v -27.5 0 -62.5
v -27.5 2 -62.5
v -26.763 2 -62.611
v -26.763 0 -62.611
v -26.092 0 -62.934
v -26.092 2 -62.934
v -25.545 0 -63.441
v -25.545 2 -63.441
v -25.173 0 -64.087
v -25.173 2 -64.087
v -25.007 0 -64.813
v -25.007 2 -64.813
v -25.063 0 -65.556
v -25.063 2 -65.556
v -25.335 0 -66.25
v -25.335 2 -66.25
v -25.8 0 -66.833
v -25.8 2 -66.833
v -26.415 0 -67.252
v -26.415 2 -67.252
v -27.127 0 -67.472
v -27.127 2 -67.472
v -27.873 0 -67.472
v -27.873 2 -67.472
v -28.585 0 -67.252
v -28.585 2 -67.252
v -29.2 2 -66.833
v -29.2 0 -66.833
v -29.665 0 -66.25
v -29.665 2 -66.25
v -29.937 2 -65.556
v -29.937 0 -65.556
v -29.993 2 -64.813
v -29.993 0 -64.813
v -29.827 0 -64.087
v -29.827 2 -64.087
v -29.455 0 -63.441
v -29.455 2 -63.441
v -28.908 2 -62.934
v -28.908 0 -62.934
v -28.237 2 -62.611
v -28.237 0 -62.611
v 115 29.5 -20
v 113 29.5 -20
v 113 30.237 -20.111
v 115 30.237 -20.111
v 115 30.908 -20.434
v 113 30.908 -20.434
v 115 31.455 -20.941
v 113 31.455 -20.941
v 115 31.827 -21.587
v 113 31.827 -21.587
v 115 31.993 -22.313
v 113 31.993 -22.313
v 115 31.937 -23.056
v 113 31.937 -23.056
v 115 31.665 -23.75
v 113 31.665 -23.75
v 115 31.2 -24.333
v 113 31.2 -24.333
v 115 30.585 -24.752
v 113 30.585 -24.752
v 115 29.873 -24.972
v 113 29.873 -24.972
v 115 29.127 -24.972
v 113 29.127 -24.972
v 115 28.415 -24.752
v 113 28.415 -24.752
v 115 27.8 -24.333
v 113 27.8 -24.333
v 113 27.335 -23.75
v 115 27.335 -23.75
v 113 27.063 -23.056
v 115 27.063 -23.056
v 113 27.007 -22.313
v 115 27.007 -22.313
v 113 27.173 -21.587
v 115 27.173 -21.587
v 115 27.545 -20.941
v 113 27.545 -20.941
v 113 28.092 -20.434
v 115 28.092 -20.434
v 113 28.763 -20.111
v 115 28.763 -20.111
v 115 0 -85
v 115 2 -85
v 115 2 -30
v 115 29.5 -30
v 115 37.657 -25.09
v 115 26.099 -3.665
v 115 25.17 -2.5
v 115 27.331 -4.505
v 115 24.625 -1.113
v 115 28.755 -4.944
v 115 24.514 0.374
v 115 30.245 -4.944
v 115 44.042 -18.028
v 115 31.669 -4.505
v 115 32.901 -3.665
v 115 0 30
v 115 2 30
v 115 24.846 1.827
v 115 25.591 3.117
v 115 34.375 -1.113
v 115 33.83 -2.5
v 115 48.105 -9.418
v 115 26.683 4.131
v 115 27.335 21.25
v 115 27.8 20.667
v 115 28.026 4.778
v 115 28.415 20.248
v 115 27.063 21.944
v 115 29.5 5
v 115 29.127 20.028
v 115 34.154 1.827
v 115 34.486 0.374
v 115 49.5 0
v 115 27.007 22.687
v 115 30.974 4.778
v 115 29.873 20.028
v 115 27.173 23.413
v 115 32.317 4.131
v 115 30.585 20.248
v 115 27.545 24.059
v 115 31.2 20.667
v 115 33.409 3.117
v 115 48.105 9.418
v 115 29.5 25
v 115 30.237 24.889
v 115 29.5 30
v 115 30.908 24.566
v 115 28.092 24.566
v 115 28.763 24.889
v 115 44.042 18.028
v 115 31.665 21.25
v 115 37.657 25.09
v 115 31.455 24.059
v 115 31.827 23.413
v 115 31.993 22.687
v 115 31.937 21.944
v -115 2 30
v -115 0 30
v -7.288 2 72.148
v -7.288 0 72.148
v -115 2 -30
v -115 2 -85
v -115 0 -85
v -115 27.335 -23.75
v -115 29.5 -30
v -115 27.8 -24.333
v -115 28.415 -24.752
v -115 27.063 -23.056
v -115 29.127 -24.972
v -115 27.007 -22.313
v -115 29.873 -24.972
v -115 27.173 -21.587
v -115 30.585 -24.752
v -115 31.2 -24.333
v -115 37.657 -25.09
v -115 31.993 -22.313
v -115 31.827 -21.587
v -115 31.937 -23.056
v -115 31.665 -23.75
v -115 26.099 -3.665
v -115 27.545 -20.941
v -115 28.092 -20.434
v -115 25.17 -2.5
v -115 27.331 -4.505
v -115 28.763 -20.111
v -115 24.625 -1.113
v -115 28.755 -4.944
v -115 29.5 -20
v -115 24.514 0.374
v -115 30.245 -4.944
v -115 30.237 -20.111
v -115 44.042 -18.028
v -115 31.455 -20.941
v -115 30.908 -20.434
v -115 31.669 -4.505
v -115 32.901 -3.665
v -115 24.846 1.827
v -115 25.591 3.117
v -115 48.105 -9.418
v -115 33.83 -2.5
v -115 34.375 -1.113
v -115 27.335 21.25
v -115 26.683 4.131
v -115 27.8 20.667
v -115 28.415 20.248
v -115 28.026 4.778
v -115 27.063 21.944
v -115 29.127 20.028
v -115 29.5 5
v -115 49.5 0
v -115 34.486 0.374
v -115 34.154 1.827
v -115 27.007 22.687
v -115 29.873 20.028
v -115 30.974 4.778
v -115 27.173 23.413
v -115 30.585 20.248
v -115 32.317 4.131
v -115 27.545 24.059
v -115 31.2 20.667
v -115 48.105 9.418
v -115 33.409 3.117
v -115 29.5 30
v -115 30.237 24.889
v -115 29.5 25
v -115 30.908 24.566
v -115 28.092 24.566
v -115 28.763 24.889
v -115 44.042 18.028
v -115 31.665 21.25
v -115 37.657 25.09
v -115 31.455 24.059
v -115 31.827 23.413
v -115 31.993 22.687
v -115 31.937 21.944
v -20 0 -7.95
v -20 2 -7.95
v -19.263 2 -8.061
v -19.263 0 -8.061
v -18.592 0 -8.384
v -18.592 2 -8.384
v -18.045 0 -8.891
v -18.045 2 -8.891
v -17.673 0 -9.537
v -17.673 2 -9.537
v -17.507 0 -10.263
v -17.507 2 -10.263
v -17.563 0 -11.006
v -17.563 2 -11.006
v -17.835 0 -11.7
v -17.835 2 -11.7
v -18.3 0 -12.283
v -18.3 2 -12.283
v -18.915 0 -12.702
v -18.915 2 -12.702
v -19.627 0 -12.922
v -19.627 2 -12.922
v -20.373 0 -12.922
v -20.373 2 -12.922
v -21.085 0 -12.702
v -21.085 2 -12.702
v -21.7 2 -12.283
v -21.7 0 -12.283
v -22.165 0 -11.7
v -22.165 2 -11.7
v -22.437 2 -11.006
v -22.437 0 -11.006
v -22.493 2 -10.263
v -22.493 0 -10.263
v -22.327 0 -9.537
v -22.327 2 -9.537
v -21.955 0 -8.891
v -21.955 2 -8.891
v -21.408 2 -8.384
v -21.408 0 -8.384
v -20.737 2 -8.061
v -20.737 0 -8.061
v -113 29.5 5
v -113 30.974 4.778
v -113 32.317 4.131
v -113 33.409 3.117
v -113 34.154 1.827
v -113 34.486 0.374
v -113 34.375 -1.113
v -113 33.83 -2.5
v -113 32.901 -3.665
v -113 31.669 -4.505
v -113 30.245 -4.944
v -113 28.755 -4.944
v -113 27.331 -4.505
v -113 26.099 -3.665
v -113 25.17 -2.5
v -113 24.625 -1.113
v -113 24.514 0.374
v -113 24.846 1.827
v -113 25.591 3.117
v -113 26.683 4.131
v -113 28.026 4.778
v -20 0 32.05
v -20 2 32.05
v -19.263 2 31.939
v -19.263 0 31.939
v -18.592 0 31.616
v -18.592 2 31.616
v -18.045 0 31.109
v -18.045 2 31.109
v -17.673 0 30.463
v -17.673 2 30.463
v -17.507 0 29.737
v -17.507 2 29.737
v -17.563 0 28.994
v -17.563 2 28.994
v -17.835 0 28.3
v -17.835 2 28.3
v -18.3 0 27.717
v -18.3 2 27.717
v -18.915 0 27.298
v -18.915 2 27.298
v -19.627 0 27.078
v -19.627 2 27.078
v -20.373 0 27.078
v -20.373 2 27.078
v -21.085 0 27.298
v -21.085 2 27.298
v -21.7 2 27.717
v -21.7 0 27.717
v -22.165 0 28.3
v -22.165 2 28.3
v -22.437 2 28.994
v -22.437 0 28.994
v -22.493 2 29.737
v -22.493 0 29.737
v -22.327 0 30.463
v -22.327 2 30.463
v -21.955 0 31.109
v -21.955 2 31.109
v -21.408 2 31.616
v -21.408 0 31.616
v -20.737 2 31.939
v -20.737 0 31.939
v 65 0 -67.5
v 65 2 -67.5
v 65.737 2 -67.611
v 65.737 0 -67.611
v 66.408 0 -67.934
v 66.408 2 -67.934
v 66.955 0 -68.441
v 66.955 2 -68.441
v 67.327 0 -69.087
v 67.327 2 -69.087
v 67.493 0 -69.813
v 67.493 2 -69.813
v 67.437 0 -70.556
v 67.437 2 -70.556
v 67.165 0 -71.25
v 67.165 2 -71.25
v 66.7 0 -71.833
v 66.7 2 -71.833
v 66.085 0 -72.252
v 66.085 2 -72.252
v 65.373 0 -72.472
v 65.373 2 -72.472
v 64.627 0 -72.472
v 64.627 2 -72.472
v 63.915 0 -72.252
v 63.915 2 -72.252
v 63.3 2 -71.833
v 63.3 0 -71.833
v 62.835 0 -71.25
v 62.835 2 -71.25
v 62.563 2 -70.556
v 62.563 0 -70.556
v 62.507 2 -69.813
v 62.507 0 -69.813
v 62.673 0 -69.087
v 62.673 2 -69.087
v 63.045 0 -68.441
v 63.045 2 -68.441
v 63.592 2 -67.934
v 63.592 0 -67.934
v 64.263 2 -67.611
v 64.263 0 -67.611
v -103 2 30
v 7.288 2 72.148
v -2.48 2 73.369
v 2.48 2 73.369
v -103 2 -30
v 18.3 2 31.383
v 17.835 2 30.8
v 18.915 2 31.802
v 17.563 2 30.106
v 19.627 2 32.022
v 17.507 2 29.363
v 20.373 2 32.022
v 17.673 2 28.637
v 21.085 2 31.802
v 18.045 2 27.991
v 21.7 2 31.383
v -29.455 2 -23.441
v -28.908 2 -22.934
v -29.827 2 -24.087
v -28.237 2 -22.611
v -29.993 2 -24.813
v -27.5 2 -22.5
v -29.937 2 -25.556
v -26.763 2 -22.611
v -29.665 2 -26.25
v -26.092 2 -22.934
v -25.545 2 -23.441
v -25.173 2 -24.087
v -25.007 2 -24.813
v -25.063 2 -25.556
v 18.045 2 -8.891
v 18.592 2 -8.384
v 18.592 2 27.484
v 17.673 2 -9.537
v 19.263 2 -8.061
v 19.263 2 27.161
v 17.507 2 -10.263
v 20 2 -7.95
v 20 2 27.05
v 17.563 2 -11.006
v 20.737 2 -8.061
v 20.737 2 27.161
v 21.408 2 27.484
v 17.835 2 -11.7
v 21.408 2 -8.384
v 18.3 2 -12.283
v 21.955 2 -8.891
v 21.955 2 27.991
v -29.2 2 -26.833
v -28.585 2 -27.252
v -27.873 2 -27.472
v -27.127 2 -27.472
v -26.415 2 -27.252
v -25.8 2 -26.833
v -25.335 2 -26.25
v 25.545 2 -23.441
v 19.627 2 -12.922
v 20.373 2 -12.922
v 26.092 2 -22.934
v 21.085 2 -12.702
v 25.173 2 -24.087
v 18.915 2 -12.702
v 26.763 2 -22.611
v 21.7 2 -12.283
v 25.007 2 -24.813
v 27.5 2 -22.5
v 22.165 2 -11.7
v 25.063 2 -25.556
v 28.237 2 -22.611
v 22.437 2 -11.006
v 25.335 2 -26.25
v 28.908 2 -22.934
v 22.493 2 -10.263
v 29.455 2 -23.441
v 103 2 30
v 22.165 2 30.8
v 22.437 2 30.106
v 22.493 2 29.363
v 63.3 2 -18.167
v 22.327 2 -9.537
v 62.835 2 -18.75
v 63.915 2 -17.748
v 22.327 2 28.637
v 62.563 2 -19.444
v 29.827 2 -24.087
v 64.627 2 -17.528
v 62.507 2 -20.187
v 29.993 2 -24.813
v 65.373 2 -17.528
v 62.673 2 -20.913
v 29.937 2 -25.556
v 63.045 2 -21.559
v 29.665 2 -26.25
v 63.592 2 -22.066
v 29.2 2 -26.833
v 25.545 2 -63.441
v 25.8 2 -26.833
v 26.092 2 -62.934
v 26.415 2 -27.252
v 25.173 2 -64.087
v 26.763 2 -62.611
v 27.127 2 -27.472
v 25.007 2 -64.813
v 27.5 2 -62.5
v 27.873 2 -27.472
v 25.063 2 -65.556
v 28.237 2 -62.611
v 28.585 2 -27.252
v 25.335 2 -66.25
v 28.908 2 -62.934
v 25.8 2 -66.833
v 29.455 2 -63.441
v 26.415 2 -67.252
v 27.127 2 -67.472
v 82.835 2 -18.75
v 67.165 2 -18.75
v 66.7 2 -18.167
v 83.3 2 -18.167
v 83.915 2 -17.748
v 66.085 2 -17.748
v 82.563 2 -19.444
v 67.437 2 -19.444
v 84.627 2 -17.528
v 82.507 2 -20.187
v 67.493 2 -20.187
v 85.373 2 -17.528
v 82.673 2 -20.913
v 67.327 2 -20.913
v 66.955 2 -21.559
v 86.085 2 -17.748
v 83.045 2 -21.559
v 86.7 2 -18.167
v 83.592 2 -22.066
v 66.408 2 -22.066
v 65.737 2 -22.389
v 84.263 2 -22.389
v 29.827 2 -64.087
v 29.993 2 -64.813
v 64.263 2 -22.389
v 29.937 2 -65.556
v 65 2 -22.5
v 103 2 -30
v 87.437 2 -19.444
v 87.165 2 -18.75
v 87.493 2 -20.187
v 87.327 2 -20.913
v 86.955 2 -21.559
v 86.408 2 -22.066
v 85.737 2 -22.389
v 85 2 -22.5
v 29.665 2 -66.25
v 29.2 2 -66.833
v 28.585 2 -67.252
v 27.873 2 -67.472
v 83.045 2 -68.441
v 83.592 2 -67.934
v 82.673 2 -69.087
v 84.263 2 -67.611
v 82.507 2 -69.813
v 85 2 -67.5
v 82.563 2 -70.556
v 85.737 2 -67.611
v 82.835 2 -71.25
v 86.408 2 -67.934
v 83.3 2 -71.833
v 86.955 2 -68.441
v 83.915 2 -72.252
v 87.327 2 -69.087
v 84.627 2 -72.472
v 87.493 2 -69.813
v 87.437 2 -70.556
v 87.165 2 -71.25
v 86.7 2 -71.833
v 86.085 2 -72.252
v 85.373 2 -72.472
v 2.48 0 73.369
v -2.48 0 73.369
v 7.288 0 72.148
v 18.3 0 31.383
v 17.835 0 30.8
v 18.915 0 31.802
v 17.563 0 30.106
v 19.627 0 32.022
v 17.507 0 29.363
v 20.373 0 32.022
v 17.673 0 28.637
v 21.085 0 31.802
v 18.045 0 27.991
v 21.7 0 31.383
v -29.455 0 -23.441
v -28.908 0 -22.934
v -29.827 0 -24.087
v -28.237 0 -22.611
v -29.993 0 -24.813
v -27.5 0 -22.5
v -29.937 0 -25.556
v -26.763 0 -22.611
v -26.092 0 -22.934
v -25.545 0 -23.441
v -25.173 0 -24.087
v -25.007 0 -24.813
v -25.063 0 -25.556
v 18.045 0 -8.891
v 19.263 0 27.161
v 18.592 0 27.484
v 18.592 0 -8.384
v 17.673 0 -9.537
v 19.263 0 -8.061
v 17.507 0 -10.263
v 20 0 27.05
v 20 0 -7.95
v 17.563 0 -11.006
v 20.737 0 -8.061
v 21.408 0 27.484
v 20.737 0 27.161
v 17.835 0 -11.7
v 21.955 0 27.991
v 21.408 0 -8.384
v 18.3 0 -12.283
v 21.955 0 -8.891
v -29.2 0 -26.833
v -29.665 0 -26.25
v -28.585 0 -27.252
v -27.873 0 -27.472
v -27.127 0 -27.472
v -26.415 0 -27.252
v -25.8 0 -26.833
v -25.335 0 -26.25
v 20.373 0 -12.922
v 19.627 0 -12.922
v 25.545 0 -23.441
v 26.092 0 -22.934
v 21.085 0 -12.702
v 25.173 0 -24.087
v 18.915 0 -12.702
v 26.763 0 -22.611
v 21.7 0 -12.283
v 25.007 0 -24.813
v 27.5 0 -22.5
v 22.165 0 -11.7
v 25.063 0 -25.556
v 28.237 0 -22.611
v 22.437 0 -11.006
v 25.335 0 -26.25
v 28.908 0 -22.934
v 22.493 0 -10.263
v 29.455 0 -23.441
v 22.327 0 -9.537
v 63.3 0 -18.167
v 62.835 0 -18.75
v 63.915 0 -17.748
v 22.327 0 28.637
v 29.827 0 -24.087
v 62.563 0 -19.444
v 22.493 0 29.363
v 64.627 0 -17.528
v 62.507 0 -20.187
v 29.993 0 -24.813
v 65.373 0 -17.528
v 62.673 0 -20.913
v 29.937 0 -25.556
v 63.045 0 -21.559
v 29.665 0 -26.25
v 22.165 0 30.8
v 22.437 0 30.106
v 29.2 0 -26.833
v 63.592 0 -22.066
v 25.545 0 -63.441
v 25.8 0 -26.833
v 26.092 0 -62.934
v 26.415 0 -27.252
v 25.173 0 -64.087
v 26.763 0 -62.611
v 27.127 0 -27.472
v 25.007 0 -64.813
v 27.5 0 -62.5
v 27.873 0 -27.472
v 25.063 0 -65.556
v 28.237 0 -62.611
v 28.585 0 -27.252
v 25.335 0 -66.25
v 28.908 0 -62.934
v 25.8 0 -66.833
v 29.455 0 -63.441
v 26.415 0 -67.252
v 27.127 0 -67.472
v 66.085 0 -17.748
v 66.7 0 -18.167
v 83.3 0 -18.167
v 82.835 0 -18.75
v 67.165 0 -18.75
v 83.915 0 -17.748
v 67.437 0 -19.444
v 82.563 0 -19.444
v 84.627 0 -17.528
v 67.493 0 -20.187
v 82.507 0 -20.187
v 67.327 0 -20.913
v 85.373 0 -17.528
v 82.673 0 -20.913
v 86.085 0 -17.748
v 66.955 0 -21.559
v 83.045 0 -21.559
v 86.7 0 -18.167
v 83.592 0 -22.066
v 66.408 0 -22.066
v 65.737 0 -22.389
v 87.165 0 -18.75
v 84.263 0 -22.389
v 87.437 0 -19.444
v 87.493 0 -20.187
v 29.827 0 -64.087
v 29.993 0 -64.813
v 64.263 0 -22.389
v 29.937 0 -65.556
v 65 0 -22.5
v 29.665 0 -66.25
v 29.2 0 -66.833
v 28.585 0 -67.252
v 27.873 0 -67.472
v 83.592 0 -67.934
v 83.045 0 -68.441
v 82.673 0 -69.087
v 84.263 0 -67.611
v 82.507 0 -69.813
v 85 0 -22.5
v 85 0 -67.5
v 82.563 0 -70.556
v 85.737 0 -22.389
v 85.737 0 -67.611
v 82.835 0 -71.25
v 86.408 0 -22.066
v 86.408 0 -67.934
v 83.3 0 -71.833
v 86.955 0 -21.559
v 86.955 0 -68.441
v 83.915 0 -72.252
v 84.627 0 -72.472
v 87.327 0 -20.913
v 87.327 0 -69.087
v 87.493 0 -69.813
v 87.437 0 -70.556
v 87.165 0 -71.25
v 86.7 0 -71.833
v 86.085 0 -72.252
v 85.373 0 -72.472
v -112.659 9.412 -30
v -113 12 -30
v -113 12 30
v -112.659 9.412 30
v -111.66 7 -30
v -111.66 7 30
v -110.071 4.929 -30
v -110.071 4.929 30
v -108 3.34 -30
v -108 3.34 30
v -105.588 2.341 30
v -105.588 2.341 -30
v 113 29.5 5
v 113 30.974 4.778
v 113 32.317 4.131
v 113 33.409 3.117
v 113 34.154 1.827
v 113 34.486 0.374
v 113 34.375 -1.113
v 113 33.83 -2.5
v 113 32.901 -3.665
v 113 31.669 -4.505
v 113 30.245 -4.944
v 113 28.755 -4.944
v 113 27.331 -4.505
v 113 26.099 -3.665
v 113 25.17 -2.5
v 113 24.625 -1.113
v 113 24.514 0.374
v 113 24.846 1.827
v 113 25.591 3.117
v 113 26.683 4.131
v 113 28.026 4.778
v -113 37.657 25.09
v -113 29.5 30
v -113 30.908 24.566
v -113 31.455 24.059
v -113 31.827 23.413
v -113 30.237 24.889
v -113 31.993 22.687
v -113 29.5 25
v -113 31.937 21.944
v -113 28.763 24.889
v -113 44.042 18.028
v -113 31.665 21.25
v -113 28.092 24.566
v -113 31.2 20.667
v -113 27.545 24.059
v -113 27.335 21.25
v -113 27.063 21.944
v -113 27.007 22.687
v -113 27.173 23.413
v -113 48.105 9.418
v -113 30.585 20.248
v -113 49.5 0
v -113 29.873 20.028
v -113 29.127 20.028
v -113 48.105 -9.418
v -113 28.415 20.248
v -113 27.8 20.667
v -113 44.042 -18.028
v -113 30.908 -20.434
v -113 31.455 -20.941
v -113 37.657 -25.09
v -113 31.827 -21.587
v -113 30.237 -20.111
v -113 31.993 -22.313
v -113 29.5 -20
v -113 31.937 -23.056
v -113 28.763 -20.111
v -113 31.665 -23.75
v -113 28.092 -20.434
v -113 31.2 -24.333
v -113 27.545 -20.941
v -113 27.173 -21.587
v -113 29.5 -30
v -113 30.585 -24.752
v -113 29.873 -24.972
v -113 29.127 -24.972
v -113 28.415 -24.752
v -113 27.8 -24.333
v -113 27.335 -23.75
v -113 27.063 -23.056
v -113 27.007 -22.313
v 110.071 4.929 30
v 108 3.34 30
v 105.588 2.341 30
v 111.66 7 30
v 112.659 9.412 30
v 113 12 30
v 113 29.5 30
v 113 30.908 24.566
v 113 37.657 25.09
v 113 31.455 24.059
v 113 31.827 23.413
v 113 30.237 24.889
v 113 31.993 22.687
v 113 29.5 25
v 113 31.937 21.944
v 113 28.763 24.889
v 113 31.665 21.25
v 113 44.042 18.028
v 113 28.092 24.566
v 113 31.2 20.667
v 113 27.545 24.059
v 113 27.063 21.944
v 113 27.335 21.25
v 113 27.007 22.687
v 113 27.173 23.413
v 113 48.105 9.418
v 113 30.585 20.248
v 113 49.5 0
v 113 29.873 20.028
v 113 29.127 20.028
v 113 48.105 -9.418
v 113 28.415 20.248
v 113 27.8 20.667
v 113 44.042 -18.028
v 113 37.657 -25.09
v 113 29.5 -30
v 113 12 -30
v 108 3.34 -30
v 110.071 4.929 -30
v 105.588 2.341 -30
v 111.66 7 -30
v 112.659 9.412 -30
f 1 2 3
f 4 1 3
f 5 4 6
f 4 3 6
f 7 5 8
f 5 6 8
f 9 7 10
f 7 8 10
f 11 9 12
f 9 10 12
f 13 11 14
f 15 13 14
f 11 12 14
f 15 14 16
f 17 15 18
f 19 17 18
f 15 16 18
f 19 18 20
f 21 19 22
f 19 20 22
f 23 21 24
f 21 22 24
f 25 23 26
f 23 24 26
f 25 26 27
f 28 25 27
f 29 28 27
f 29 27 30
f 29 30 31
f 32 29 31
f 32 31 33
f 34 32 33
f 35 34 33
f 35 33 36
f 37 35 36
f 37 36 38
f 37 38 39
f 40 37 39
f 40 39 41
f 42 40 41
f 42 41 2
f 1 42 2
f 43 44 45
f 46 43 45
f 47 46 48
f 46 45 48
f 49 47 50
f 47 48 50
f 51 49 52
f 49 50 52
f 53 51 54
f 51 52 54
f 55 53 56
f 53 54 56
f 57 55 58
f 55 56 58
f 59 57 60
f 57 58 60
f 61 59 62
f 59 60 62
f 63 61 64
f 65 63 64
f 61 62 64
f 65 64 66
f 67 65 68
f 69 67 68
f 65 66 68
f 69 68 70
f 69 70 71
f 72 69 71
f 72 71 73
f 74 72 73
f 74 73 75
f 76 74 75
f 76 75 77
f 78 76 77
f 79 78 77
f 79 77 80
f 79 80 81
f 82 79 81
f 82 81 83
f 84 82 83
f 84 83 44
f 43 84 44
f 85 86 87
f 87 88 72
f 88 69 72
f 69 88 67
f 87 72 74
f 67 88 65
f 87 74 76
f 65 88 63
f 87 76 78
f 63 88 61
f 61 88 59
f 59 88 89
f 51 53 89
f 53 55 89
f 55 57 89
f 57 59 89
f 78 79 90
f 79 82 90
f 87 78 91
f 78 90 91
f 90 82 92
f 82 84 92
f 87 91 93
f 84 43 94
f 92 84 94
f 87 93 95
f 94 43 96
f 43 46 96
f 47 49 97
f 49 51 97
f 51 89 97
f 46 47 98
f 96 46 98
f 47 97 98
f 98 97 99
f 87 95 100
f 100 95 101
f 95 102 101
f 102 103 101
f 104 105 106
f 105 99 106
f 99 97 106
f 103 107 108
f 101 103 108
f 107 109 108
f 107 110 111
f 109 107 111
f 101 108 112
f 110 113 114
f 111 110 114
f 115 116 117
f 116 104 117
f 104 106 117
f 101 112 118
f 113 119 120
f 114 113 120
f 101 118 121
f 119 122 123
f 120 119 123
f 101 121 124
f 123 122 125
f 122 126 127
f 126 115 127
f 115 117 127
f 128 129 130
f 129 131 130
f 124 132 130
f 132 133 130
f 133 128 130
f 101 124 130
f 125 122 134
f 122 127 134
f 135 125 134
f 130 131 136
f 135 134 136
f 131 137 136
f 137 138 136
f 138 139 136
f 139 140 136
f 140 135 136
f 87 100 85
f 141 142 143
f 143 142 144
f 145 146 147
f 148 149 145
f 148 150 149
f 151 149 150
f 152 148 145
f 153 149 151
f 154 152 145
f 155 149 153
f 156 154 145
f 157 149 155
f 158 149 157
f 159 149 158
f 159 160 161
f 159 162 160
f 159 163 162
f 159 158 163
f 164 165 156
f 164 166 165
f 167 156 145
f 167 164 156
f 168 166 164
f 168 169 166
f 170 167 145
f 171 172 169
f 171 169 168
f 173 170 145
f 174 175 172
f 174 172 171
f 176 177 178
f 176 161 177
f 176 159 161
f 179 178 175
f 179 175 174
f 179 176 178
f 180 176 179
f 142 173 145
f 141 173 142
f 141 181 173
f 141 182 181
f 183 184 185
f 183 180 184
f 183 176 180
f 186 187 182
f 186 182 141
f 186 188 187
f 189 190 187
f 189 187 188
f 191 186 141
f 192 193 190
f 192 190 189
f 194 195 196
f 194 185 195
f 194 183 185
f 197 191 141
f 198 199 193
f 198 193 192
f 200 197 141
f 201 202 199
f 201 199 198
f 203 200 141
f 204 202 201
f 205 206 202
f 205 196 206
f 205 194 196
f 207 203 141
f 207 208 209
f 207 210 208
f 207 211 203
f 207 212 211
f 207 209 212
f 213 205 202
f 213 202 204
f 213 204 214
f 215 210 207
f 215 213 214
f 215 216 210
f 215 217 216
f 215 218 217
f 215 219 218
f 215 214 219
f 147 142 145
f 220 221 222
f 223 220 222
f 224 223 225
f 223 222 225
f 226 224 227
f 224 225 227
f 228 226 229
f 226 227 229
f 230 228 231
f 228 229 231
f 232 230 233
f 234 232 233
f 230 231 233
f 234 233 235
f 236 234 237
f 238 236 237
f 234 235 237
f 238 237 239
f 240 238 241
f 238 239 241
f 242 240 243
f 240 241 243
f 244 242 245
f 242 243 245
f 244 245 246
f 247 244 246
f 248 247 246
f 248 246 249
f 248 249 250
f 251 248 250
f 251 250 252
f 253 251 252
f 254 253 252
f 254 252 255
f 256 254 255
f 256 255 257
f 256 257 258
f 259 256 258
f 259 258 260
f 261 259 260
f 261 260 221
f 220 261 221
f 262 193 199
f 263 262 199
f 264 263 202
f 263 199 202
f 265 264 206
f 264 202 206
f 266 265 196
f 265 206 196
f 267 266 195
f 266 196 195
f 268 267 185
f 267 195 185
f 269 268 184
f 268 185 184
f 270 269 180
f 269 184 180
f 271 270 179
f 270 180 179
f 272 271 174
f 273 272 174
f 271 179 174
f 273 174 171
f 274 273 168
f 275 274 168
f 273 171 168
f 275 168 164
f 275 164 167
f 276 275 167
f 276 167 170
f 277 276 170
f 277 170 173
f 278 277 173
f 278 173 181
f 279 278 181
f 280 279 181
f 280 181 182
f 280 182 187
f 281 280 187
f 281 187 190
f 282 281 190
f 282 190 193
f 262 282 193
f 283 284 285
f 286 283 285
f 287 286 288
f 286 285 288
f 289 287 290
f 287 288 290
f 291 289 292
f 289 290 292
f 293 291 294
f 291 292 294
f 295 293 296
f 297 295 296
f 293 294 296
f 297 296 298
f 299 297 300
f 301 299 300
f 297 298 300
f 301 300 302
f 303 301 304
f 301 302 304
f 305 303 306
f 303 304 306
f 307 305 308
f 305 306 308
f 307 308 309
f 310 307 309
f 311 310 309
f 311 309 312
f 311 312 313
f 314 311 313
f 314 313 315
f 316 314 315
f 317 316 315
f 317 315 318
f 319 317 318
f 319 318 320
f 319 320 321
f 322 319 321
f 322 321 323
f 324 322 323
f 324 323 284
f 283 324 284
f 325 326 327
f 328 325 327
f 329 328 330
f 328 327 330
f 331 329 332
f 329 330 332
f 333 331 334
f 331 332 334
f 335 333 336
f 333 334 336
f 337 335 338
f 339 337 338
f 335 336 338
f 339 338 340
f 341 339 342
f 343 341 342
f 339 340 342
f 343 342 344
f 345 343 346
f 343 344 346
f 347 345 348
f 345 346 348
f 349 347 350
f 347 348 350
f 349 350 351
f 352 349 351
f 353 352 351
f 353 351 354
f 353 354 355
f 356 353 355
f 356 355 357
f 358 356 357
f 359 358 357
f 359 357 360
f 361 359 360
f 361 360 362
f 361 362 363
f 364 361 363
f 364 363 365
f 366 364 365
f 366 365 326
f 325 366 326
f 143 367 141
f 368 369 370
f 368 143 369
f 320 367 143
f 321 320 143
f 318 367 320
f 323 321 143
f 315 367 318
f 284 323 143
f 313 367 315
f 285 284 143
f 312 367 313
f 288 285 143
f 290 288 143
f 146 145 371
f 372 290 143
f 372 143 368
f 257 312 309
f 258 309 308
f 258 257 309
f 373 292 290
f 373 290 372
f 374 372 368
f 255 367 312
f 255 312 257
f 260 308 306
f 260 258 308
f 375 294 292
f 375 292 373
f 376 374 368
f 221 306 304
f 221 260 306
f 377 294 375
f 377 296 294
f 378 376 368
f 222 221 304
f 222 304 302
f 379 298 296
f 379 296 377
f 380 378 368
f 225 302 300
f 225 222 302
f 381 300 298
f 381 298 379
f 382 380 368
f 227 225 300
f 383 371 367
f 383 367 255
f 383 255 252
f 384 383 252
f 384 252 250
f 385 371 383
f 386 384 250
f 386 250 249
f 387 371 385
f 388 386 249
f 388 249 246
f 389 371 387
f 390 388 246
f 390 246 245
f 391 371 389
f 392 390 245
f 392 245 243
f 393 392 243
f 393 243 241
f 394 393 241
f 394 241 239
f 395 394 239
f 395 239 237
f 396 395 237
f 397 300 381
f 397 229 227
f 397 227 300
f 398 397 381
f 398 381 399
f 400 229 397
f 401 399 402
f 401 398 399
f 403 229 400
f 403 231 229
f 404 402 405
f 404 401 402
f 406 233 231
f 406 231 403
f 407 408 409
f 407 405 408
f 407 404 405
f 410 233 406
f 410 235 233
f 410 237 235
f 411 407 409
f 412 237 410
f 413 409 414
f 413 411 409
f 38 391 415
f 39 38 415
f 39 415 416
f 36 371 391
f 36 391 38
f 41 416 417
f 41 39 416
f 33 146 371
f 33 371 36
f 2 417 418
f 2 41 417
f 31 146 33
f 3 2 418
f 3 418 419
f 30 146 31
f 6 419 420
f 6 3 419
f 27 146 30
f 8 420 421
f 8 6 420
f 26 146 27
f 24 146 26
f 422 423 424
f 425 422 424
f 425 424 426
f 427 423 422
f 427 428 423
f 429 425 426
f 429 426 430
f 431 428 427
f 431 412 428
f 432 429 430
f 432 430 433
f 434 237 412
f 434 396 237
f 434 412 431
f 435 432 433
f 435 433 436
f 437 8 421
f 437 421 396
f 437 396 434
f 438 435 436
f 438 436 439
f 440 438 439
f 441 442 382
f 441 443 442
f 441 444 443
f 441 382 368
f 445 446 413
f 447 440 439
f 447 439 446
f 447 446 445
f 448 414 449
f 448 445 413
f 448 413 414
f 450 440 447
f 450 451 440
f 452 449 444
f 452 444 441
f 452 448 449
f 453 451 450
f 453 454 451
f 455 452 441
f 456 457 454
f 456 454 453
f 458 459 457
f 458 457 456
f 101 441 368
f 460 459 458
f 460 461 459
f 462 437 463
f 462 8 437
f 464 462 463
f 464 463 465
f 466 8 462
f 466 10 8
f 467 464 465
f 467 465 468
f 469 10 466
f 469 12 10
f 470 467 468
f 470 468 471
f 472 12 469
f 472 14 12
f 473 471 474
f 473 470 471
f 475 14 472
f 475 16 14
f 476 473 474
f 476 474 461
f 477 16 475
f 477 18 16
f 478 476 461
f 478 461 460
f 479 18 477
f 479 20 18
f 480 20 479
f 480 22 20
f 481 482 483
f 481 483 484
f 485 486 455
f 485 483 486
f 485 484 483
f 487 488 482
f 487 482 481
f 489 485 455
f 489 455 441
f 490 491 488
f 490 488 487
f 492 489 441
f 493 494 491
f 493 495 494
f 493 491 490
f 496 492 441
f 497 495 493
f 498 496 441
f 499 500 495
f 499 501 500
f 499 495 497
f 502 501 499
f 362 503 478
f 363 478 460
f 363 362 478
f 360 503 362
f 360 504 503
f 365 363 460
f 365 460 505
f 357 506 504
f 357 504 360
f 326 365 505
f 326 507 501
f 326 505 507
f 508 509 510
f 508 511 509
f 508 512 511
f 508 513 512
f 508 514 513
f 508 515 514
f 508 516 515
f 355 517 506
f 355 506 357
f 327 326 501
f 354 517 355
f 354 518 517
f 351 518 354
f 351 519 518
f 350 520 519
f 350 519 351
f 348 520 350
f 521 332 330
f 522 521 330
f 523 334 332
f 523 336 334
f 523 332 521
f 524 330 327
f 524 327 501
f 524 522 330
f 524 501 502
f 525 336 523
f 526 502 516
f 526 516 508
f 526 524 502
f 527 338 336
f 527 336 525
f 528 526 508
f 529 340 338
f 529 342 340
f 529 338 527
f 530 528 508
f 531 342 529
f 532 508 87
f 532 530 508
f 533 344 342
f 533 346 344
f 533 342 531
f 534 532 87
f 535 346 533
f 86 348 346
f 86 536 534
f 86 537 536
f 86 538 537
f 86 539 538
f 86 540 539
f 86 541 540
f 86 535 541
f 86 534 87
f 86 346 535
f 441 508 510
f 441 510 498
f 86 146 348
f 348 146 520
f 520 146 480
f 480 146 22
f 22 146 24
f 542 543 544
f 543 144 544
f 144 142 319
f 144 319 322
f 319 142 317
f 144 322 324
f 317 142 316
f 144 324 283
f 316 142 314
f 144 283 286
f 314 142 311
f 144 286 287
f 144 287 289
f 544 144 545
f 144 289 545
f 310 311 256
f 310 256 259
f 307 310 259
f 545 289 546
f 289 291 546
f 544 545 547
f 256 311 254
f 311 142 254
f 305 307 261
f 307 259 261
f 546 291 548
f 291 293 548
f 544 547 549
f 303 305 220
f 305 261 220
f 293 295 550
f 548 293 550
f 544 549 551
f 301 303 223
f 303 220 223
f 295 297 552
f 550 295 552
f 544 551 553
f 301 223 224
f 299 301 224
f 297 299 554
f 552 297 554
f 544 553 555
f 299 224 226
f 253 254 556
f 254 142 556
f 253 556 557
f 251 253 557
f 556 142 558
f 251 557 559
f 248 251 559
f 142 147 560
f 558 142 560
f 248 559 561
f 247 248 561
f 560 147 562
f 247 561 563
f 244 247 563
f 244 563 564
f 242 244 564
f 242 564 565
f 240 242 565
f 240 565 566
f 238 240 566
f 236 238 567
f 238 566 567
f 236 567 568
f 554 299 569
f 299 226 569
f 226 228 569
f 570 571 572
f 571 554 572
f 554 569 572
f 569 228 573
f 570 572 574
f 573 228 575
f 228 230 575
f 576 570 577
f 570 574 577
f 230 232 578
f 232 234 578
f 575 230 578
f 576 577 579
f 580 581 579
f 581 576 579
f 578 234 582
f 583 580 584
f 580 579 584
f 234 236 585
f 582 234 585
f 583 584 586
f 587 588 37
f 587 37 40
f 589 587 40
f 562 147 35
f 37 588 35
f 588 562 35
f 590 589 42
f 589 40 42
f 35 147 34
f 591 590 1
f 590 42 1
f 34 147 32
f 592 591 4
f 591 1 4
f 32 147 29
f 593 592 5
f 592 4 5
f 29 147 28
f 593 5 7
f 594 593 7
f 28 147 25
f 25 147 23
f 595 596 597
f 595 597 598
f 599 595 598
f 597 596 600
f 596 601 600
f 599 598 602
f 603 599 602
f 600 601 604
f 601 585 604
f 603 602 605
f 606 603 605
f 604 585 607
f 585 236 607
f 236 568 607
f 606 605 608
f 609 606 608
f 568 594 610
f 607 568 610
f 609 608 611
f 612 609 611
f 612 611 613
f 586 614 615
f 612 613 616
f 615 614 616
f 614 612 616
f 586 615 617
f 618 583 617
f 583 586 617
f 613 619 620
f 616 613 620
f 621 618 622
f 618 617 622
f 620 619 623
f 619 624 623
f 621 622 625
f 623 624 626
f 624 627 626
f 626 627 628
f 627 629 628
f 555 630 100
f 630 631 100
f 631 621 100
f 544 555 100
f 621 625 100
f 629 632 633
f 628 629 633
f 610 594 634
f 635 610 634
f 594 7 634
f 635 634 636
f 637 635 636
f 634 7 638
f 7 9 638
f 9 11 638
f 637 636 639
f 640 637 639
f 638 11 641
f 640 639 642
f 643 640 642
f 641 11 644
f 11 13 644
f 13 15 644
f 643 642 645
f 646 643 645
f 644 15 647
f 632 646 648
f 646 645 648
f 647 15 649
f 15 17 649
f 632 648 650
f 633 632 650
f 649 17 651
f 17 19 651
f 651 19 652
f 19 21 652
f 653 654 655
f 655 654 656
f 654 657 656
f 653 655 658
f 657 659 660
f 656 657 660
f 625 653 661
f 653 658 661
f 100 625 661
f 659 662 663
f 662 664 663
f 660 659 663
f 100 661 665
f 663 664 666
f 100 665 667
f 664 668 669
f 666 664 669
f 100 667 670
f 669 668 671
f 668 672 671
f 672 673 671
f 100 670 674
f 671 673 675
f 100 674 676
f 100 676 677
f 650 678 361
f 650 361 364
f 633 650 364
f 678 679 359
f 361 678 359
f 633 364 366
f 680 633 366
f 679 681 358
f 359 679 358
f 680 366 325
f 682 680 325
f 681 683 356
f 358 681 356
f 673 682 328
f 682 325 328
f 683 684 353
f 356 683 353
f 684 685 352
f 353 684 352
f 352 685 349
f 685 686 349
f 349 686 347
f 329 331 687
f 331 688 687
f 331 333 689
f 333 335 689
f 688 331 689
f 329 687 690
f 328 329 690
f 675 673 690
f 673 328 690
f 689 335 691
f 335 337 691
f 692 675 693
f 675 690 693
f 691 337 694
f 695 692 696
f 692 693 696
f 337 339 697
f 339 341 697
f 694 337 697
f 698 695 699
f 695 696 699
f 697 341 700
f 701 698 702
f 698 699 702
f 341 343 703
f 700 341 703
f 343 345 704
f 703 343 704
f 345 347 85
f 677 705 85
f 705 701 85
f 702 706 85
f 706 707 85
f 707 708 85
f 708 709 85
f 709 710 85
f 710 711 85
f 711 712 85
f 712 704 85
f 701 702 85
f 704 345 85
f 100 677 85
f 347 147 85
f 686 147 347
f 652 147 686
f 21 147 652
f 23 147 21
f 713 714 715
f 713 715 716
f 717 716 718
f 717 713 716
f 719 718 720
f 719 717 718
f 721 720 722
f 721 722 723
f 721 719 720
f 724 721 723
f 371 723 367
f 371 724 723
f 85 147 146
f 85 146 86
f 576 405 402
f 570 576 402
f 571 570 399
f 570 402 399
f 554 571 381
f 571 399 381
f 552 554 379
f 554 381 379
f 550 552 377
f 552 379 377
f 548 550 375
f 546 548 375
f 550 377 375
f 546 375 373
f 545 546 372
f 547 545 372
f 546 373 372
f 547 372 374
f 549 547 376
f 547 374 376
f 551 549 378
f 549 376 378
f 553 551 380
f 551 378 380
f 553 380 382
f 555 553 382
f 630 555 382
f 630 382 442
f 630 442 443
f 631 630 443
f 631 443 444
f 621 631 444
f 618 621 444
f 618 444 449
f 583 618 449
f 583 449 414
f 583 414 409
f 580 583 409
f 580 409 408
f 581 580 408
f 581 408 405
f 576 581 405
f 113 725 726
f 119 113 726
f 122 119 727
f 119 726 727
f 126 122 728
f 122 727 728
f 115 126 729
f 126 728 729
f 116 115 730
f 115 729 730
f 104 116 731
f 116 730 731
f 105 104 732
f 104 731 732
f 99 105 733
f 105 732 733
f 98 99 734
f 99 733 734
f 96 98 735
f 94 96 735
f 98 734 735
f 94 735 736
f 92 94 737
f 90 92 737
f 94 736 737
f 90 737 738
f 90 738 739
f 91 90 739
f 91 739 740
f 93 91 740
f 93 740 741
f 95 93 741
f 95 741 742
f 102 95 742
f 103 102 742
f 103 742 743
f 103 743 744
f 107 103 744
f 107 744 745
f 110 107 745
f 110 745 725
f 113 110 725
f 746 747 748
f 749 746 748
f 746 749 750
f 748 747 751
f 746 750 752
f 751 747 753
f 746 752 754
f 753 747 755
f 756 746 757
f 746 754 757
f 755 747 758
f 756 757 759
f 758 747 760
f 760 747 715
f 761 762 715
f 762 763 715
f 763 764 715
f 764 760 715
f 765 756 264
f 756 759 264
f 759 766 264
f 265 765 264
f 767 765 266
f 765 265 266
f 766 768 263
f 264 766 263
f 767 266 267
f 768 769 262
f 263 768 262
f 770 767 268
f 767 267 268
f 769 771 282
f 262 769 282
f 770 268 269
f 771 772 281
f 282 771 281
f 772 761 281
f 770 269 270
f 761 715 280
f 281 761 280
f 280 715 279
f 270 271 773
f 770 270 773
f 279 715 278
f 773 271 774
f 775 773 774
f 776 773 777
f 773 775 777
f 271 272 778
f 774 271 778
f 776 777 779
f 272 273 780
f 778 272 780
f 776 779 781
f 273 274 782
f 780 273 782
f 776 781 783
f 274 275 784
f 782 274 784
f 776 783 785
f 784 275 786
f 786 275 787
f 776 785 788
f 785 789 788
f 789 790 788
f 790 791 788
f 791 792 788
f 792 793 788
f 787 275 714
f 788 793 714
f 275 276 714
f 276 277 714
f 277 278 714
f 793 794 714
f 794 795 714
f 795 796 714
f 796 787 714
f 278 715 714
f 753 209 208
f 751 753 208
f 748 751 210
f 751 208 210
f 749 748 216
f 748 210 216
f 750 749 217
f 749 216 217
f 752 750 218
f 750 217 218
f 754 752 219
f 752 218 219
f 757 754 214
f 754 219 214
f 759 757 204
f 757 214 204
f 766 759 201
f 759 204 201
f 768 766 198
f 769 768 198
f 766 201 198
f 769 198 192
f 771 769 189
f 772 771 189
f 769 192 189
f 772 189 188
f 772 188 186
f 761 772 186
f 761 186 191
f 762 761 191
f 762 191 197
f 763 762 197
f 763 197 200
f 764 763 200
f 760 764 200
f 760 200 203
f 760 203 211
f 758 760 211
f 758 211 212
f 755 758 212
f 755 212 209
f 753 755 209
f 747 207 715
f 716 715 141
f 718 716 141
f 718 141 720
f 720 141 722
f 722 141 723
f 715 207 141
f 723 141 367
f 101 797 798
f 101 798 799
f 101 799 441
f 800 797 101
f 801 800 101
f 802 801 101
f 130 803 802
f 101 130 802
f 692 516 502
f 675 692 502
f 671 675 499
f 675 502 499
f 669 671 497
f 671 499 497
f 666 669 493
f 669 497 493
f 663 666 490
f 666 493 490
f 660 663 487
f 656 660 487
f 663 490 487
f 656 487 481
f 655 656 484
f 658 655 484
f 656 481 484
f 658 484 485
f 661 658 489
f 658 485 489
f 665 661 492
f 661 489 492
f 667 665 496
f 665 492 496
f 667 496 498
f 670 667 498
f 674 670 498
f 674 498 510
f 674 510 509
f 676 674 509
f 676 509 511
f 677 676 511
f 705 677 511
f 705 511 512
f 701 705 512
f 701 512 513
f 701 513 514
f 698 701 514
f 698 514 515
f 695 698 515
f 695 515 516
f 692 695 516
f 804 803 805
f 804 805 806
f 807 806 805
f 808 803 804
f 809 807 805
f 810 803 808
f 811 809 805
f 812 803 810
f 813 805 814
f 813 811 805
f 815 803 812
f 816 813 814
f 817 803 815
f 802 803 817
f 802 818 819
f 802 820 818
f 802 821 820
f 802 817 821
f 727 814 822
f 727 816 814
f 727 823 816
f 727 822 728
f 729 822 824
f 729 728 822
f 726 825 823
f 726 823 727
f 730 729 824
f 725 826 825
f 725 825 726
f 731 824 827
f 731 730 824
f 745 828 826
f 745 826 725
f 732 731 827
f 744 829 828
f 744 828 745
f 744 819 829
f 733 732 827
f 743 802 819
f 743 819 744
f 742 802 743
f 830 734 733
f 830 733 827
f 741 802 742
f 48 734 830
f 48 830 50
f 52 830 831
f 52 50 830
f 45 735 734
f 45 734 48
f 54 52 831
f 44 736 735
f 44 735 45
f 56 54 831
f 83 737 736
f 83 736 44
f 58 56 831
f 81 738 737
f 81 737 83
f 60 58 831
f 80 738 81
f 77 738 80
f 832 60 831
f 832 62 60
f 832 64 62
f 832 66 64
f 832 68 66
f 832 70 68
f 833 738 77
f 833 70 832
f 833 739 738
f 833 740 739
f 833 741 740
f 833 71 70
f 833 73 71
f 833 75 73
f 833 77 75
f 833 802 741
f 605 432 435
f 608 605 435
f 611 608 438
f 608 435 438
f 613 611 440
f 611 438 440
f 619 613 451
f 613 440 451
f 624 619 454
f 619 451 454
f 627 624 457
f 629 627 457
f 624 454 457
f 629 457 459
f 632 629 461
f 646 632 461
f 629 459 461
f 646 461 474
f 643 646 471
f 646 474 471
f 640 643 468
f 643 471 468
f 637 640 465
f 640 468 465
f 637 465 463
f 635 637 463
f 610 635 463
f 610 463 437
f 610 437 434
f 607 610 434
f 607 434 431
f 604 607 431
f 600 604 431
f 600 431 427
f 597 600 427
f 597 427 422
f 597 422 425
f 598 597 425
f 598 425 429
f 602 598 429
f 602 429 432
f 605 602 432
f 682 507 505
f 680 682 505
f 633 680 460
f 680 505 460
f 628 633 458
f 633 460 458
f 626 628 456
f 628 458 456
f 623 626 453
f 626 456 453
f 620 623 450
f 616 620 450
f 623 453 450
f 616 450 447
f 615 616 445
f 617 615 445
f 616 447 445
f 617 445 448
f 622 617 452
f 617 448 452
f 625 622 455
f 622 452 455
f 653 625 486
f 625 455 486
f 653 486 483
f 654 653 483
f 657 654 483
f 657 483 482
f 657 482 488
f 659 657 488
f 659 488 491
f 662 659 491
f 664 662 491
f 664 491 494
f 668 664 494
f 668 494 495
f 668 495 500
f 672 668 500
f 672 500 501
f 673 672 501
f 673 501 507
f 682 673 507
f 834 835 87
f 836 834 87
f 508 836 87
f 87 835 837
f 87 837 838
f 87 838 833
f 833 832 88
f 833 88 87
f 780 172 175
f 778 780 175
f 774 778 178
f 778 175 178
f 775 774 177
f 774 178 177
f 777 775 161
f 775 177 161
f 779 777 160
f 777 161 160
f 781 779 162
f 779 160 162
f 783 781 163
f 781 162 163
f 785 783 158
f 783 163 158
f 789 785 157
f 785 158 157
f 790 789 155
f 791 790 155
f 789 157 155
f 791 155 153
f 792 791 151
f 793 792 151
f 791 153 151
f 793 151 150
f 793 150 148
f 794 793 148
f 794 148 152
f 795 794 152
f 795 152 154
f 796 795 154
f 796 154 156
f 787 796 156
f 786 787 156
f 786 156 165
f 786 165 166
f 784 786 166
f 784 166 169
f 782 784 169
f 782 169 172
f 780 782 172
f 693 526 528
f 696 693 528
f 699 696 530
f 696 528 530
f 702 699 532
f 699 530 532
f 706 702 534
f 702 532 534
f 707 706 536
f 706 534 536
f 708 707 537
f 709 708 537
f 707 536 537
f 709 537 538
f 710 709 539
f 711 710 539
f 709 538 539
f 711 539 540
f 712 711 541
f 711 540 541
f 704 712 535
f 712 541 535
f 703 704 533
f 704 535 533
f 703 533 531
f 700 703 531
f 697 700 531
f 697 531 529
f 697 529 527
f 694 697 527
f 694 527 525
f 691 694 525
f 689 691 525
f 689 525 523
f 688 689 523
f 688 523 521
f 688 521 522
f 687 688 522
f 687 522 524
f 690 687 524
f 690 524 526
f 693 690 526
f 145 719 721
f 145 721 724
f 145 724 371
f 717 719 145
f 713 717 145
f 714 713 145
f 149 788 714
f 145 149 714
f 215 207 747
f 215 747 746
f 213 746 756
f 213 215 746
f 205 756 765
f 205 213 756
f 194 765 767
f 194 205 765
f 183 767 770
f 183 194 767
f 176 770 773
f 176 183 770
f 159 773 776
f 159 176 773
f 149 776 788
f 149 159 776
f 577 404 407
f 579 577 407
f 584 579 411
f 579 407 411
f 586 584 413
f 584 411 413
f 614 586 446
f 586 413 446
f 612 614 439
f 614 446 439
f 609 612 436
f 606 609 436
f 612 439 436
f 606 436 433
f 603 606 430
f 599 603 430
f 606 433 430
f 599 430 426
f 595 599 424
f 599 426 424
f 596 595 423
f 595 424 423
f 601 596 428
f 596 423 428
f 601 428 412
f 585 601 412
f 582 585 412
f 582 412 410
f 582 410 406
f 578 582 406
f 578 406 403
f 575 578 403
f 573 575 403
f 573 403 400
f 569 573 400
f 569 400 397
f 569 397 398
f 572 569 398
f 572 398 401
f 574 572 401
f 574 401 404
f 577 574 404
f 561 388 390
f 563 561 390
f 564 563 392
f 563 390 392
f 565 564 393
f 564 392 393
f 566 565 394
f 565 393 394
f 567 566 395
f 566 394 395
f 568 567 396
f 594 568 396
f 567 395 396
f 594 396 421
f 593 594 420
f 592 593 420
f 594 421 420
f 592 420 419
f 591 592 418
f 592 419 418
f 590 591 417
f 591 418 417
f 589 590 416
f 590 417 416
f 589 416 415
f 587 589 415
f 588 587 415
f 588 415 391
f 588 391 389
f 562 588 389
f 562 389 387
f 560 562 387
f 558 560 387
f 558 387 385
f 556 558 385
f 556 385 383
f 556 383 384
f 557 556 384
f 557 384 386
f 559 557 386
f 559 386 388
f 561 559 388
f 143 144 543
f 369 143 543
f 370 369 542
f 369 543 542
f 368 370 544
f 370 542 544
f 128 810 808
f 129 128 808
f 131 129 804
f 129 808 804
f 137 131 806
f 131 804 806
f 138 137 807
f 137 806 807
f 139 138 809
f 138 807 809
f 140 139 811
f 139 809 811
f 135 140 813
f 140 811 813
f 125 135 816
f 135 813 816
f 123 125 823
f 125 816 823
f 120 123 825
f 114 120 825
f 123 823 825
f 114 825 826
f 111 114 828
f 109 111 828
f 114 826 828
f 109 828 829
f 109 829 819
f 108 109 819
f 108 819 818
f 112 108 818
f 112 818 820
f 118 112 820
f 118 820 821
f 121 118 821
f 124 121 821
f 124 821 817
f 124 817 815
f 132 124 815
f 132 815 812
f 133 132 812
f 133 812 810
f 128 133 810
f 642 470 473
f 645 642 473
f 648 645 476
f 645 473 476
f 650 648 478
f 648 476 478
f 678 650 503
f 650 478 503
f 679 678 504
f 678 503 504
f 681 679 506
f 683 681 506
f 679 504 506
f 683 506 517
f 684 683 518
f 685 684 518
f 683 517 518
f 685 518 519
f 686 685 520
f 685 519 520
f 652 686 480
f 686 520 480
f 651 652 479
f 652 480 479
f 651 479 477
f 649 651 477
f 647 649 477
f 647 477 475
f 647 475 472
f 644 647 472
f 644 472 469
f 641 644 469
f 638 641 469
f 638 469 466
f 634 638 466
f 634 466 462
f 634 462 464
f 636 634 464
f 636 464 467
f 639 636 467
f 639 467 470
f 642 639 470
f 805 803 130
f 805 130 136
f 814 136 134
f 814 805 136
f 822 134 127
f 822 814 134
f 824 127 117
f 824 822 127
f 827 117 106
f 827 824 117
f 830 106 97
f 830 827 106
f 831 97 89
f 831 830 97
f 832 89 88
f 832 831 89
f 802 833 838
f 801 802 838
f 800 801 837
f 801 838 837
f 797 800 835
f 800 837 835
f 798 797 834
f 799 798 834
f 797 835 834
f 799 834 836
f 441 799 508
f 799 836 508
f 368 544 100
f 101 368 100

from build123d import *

# Parameters (mm, degrees)
BOSS_EXTRUDE1_DEPTH      = 2
SKETCH2_W                = 2
SKETCH2_H                = 60
BOSS_EXTRUDE2_DEPTH      = 55
SKETCH3_R                = 5
CUT_EXTRUDE1_DEPTH       = 283
SKETCH4_R                = 2.5
CUT_EXTRUDE2_DEPTH       = 283
SKETCH9_W                = 230
SKETCH9_H                = 50
BOSS_EXTRUDE3_DEPTH      = 2
SKETCH13_W               = 230
SKETCH13_H               = 10
BOSS_EXTRUDE6_DEPTH      = 20
CUT_EXTRUDE9_START       = -230
CUT_EXTRUDE9_DEPTH       = 230
SKETCH31_R               = 2.5
CUT_EXTRUDE11_DEPTH      = 10
SKETCH32_R               = 2.5
CUT_EXTRUDE12_DEPTH      = 10
SKETCH33_R               = 2.5
CUT_EXTRUDE13_DEPTH      = 10
CUT_EXTRUDE14_DEPTH      = 180.947909129
CUT_EXTRUDE14_DEPTH_BACK = 180.947909129
CUT_EXTRUDE16_DEPTH      = 151.685931659
CUT_EXTRUDE16_DEPTH_BACK = 151.685931659
BOSS_EXTRUDE8_DEPTH      = 60


# Read off the part's stored shape, not the designer's step: Cut-Extrude9
with BuildPart() as part:
    # Sketch1 → Boss-Extrude1 (new body)
    with BuildSketch(Plane(origin=(0, 0, 0), x_dir=(1, 0, 0), z_dir=(0, 1, 0))):
        Polygon((115, 50), (115, 80), (-115, 80), (-115, 50), (-115, -50), (-115, -75), (115, -75), (115, -50), align=None)
    extrude(amount=BOSS_EXTRUDE1_DEPTH)

    # Sketch2 → Boss-Extrude2 (add)
    with BuildSketch(Plane(origin=(0, 2, 0), x_dir=(1, 0, 0), z_dir=(0, 1, 0))):
        with Locations((-114, 0)):
            Rectangle(SKETCH2_W, SKETCH2_H)
        with Locations((114, 0)):
            Rectangle(SKETCH2_W, SKETCH2_H)
    extrude(amount=BOSS_EXTRUDE2_DEPTH)

    # Sketch3 → Cut-Extrude1 (cut)
    with BuildSketch(Plane.ZY.offset(115)):
        with Locations((0, 29.5)):
            Circle(SKETCH3_R)
    extrude(amount=-CUT_EXTRUDE1_DEPTH, mode=Mode.SUBTRACT)

    # Sketch4 → Cut-Extrude2 (cut)
    with BuildSketch(Plane.ZY.offset(115)):
        with Locations((-22.5, 29.5)):
            Circle(SKETCH4_R)
        with Locations((22.5, 29.5)):
            Circle(SKETCH4_R)
    extrude(amount=-CUT_EXTRUDE2_DEPTH, mode=Mode.SUBTRACT)

    # Sketch9 → Boss-Extrude3 (add)
    with BuildSketch(Plane(origin=(0, 2, 0), x_dir=(1, 0, 0), z_dir=(0, 1, 0))):
        with Locations((0, 105)):
            Rectangle(SKETCH9_W, SKETCH9_H)
    extrude(amount=-BOSS_EXTRUDE3_DEPTH)

    # Sketch13 → Boss-Extrude6 (add)
    with BuildSketch(Plane.XZ):
        with Locations((0, -125)):
            Rectangle(SKETCH13_W, SKETCH13_H)
    extrude(amount=BOSS_EXTRUDE6_DEPTH)

    # Cut-Extrude9 outline → Cut-Extrude9 (cut)
    with BuildSketch(Plane(origin=(115, 0, 0), x_dir=(0, 0, -1), z_dir=(1, 0, 0)).offset(CUT_EXTRUDE9_START)):
        with BuildLine():
            Line((-30, 57), (-30, 29.5))
            ThreePointArc((-30, 29.5), (0, 49.5), (30, 29.5))
            Line((30, 29.5), (30, 57))
            Line((30, 57), (-30, 57))
        make_face()
    extrude(amount=CUT_EXTRUDE9_DEPTH, mode=Mode.SUBTRACT)

    # Sketch31 → Cut-Extrude11 (cut)
    with BuildSketch(Plane(origin=(0, 2, 0), x_dir=(1, 0, 0), z_dir=(0, 1, 0))):
        with Locations(Location((-27.5, 65, 0), (0, 0, 270))):
            Circle(SKETCH31_R)
        with Locations(Location((27.5, 65, 0), (0, 0, 270))):
            Circle(SKETCH31_R)
        with Locations(Location((-27.5, 25, 0), (0, 0, 270))):
            Circle(SKETCH31_R)
        with Locations(Location((27.5, 25, 0), (0, 0, 270))):
            Circle(SKETCH31_R)
    extrude(amount=-CUT_EXTRUDE11_DEPTH, mode=Mode.SUBTRACT)

    # Sketch32 → Cut-Extrude12 (cut)
    with BuildSketch(Plane(origin=(0, 2, 0), x_dir=(1, 0, 0), z_dir=(0, 1, 0))):
        with Locations(Location((85, 70, 0), (0, 0, 270))):
            Circle(SKETCH32_R)
        with Locations(Location((65, 70, 0), (0, 0, 270))):
            Circle(SKETCH32_R)
        with Locations(Location((65, 20, 0), (0, 0, 90))):
            Circle(SKETCH32_R)
        with Locations(Location((85, 20, 0), (0, 0, 90))):
            Circle(SKETCH32_R)
    extrude(amount=-CUT_EXTRUDE12_DEPTH, mode=Mode.SUBTRACT)

    # Sketch33 → Cut-Extrude13 (cut)
    with BuildSketch(Plane(origin=(0, 2, 0), x_dir=(1, 0, 0), z_dir=(0, 1, 0))):
        with Locations(Location((-20, 10.45, 0), (0, 0, 270))):
            Circle(SKETCH33_R)
        with Locations(Location((20, 10.45, 0), (0, 0, 270))):
            Circle(SKETCH33_R)
        with Locations(Location((-20, -29.55, 0), (0, 0, 270))):
            Circle(SKETCH33_R)
        with Locations(Location((20, -29.55, 0), (0, 0, 90))):
            Circle(SKETCH33_R)
    extrude(amount=-CUT_EXTRUDE13_DEPTH, mode=Mode.SUBTRACT)

    # Sketch34 → Cut-Extrude14 (cut, two sides: drawn at the far end of the back side and taken through both)
    with BuildSketch(Plane(origin=(0, 2, 0), x_dir=(1, 0, 0), z_dir=(0, 1, 0)).offset(-CUT_EXTRUDE14_DEPTH_BACK)):
        Polygon((685.357029045, 85), (115, 85), (-115, 85), (-685.357029045, 85), (-685.357029045, 1225.71405809), (685.357029045, 1225.71405809), align=None)
    extrude(amount=CUT_EXTRUDE14_DEPTH + CUT_EXTRUDE14_DEPTH_BACK, mode=Mode.SUBTRACT)

    # Sketch36 → Cut-Extrude16 (cut, two sides: drawn at the far end of the back side and taken through both)
    with BuildSketch(Plane(origin=(0, 2, 0), x_dir=(1, 0, 0), z_dir=(0, 1, 0)).offset(-CUT_EXTRUDE16_DEPTH_BACK)):
        with BuildLine():
            Line((-603.246524362, 161.052987794), (-115, -30))
            Line((-115, -30), (-7.287986972, -72.148179011))
            ThreePointArc((-7.287986972, -72.148179011), (0, -73.523323417), (7.287986972, -72.148179011))
            Line((7.287986972, -72.148179011), (115, -30))
            Line((115, -30), (603.246524362, 161.052987794))
            Line((603.246524362, 161.052987794), (603.246524362, -887.538281856))
            Line((603.246524362, -887.538281856), (-603.246524362, -887.538281856))
            Line((-603.246524362, -887.538281856), (-603.246524362, 161.052987794))
        make_face()
    extrude(amount=CUT_EXTRUDE16_DEPTH + CUT_EXTRUDE16_DEPTH_BACK, mode=Mode.SUBTRACT)

    # Sketch37 → Boss-Extrude8 (add)
    with BuildSketch(Plane(origin=(0, 0, -30), x_dir=(-1, 0, 0), z_dir=(0, 0, -1))):
        with BuildLine():
            Line((-103, 2), (-113, 2))
            Line((-113, 2), (-113, 12))
            ThreePointArc((-113, 12), (-110.071067812, 4.928932188), (-103, 2))
        make_face()
        with BuildLine():
            Line((103, 2), (113, 2))
            Line((113, 2), (113, 12))
            ThreePointArc((113, 12), (110.071067812, 4.928932188), (103, 2))
        make_face()
    extrude(amount=-BOSS_EXTRUDE8_DEPTH)


solid = part.part
